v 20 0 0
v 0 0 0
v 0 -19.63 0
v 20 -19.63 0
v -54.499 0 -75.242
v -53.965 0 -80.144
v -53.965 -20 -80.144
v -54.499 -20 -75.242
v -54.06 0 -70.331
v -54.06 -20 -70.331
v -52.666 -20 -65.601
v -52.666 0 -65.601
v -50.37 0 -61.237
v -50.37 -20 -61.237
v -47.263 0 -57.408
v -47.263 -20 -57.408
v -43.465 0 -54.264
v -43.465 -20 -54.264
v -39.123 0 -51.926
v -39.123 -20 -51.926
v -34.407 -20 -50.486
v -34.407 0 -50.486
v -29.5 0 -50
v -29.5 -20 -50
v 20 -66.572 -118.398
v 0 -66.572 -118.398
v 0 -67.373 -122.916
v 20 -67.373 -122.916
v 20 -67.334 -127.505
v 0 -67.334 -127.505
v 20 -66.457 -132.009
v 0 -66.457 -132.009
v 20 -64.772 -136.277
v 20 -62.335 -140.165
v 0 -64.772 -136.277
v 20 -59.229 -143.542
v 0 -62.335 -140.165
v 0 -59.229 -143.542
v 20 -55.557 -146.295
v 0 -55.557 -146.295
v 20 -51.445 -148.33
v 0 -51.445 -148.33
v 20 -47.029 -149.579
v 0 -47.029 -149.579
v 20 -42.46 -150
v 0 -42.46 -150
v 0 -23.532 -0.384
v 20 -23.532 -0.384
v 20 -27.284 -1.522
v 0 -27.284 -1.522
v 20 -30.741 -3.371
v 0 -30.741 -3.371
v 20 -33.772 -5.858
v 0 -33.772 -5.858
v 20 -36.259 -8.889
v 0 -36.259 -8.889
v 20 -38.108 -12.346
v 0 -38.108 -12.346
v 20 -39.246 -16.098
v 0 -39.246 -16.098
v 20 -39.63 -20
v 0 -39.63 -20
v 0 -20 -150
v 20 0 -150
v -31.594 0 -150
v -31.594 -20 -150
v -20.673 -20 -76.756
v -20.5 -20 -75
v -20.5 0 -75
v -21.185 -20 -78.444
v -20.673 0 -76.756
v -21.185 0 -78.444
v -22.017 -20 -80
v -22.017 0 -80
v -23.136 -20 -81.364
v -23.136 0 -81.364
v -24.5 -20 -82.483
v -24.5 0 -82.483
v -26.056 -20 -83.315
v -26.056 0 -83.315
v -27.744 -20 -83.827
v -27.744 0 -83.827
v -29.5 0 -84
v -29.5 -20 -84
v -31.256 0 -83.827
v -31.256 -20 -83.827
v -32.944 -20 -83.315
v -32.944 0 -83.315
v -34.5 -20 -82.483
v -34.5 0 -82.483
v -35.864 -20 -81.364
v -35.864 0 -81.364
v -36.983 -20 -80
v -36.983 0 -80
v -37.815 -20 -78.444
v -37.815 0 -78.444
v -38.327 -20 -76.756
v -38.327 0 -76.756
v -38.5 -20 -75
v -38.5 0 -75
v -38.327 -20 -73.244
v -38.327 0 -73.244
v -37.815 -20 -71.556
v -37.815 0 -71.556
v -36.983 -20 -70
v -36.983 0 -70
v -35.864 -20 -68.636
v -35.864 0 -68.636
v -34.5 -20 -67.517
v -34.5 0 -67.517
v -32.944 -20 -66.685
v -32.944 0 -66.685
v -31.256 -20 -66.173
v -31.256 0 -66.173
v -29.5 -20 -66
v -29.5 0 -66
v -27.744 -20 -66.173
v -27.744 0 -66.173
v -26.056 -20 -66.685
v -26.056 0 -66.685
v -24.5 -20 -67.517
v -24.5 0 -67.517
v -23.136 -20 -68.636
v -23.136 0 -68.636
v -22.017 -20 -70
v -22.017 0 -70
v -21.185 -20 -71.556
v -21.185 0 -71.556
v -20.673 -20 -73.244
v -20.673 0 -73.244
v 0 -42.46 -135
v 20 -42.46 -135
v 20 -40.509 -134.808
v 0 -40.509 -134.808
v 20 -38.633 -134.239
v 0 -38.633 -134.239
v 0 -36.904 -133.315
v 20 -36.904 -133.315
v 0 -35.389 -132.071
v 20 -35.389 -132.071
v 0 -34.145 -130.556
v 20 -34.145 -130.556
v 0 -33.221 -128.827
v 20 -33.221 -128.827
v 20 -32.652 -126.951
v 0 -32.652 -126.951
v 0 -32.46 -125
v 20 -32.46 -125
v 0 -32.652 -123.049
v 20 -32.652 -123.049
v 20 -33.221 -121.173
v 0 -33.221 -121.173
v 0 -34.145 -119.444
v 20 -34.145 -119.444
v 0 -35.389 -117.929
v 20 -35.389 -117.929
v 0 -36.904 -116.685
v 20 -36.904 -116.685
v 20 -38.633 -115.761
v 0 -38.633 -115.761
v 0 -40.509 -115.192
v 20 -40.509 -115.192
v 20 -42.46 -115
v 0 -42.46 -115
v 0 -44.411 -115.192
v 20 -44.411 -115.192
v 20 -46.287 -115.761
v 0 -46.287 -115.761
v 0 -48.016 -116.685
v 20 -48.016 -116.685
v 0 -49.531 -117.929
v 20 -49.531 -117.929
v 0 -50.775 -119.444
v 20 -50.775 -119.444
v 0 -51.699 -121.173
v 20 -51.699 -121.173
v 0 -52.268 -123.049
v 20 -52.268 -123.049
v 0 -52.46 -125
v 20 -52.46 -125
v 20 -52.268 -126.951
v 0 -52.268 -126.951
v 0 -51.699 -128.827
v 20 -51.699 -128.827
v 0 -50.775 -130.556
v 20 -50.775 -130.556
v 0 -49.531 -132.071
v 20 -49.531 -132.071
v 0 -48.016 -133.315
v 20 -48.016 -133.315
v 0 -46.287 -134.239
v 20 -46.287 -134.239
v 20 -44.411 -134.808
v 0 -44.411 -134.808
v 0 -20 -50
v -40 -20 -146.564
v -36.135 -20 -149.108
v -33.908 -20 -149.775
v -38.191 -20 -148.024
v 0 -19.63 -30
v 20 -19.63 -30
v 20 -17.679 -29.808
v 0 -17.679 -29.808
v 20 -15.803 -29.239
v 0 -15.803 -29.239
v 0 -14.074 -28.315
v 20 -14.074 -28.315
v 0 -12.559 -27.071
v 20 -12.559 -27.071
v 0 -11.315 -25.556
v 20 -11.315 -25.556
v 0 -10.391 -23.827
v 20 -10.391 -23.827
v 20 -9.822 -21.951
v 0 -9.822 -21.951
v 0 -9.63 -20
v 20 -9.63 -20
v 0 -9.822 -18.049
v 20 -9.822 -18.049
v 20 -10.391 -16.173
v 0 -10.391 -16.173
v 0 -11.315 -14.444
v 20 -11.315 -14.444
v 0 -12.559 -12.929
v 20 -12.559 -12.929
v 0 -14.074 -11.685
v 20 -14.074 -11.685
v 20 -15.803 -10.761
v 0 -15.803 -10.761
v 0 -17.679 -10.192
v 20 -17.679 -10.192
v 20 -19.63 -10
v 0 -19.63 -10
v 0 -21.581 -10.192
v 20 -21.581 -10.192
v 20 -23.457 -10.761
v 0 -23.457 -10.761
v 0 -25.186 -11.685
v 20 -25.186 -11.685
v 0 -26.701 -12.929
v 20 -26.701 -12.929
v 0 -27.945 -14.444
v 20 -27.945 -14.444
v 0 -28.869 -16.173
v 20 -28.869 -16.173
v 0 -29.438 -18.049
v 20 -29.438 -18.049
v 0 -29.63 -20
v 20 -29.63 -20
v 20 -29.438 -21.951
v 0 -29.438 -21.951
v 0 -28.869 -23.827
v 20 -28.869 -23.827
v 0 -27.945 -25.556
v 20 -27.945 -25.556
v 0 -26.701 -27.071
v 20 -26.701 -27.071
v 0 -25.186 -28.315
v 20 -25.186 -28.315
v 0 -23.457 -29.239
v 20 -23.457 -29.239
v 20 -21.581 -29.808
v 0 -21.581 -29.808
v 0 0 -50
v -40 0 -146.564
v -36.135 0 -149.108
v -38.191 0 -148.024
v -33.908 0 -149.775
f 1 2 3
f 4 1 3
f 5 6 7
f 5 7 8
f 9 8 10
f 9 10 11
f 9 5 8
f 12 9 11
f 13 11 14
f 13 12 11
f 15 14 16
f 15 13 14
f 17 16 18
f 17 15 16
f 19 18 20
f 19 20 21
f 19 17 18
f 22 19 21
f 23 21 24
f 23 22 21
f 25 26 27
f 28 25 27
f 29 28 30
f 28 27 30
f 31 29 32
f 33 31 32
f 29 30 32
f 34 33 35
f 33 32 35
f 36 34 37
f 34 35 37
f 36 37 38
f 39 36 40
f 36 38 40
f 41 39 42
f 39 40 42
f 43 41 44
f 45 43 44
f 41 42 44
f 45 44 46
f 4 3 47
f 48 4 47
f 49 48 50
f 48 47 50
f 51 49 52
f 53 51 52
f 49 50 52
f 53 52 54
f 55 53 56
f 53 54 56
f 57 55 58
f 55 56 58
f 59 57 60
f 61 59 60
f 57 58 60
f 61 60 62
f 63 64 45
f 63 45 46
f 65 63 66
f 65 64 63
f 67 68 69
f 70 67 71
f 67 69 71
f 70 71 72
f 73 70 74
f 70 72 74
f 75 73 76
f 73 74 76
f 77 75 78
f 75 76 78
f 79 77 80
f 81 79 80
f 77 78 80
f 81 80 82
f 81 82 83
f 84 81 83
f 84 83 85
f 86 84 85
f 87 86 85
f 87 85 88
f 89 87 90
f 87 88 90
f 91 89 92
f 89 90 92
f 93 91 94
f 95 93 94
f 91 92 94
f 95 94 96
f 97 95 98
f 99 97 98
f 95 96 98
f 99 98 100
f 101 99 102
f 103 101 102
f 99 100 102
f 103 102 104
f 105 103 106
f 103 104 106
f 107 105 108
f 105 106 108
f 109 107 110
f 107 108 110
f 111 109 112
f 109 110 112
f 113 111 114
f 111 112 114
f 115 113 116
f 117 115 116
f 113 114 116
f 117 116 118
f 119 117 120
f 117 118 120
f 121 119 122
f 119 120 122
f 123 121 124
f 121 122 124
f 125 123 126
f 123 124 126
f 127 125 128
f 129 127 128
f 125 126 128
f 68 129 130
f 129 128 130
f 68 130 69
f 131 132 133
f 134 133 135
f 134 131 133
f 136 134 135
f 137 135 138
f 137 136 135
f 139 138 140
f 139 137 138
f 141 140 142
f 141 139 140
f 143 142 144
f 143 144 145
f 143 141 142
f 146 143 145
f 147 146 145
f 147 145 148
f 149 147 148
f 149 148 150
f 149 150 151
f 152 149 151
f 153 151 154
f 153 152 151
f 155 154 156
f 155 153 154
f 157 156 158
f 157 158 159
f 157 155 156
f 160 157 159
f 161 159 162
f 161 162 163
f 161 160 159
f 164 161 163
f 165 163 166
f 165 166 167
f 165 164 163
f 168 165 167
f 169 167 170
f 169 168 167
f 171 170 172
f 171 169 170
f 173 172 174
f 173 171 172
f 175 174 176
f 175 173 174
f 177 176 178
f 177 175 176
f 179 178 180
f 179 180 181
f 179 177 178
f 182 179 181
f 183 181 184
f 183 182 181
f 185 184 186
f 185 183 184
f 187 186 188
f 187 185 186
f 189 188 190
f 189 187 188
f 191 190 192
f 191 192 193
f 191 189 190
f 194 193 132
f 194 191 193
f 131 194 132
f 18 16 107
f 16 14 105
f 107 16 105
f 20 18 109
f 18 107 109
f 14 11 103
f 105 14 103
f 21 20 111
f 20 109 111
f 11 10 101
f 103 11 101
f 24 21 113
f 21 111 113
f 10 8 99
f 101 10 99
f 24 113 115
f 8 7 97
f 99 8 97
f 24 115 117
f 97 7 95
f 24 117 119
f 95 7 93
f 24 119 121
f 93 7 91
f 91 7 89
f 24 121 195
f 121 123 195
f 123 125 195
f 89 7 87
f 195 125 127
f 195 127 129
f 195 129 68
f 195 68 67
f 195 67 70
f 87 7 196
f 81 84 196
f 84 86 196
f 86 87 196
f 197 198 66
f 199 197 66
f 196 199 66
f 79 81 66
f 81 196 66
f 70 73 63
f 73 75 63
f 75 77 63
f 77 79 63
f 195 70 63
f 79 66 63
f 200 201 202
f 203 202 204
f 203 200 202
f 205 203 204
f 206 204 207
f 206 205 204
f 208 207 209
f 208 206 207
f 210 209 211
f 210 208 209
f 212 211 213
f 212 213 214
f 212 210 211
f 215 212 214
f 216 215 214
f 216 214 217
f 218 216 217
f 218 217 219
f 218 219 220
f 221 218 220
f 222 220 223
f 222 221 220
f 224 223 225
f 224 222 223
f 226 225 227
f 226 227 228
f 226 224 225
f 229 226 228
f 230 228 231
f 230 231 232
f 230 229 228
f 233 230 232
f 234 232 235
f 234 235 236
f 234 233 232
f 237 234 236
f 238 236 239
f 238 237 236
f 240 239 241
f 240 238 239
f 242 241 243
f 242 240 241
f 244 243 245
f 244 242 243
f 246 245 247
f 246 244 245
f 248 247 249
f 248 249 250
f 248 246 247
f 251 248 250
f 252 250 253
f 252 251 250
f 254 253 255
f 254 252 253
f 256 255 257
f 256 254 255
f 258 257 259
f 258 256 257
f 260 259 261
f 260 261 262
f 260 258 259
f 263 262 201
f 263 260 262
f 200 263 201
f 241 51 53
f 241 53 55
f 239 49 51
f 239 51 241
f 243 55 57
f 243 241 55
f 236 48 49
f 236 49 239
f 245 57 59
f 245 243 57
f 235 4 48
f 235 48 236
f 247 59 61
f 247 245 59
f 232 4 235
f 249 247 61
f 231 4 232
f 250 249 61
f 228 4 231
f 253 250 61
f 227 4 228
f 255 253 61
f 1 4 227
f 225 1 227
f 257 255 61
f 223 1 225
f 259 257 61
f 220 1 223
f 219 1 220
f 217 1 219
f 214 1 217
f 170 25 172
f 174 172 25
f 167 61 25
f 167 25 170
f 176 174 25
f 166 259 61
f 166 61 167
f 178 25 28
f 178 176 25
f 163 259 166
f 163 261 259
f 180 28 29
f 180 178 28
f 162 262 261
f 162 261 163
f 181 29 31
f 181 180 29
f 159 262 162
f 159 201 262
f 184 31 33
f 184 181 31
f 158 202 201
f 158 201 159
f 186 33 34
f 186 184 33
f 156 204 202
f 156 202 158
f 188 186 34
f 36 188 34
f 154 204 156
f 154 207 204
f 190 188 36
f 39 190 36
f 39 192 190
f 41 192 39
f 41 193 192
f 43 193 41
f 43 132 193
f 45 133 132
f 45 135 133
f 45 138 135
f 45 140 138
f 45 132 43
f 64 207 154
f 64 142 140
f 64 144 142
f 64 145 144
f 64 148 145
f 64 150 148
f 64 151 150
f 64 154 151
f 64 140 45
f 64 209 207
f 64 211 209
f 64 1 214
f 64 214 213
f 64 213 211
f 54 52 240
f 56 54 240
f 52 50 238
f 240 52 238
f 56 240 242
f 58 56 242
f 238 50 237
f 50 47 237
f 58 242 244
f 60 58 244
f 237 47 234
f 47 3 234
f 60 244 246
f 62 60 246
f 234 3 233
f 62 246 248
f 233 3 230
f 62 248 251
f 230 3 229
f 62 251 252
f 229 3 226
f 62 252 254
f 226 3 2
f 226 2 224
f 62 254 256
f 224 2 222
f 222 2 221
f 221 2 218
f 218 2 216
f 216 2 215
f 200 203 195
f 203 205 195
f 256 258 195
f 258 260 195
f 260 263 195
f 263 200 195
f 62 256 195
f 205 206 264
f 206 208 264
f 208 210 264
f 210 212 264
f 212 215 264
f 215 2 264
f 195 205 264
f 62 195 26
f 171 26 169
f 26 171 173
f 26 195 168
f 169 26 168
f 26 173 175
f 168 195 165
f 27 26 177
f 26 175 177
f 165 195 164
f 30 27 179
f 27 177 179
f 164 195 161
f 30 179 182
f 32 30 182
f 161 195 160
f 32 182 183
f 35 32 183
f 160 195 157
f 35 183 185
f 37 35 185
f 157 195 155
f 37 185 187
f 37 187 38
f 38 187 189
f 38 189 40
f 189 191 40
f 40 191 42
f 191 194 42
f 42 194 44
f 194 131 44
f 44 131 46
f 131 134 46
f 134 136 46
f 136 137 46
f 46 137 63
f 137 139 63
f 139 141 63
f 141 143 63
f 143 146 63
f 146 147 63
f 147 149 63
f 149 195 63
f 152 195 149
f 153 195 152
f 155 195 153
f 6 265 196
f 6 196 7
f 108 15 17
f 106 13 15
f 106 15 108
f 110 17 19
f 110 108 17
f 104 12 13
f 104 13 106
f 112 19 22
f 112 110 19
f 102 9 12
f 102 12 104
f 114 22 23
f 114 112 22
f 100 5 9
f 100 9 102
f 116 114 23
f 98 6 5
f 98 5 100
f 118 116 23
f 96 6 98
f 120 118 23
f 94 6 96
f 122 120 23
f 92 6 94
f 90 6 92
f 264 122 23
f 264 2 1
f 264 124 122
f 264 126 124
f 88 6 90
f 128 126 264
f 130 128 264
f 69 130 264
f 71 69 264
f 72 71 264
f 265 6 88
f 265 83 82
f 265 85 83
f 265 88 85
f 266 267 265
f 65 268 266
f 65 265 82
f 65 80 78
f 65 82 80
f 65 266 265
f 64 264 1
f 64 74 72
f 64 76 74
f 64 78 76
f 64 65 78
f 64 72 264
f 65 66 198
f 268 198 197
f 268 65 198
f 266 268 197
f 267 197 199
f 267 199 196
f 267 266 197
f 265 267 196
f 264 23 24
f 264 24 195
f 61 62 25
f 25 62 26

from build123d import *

# Parameters (mm, degrees)
SKETCH1_R           = 10
BOSS_EXTRUDE1_DEPTH = 20
SKETCH2_R           = 9
BOSS_EXTRUDE2_DEPTH = 20


with BuildPart() as part:
    # Sketch1 → Boss-Extrude1 (new body)
    with BuildSketch(Plane(origin=(0, 0, 0), x_dir=(0, 0, -1), z_dir=(1, 0, 0))):
        with BuildLine():
            Line((0, 0), (0, -19.63))
            ThreePointArc((0, -19.63), (5.857864376, -33.772135624), (20, -39.63))
            Line((20, -39.63), (118.39773122, -66.572445893))
            ThreePointArc((118.39773122, -66.572445893), (140.164815866, -62.335320368), (150, -42.46))
            Line((150, -42.46), (150, 0))
            Line((150, 0), (0, 0))
        make_face()
        with Locations((20, -19.63)):
            Circle(SKETCH1_R, mode=Mode.SUBTRACT)
        with Locations((125, -42.46)):
            Circle(SKETCH1_R, mode=Mode.SUBTRACT)
    extrude(amount=BOSS_EXTRUDE1_DEPTH)

    # Sketch2 → Boss-Extrude2 (add)
    with BuildSketch(Plane(origin=(0, 0, 0), x_dir=(1, 0, 0), z_dir=(0, 1, 0))):
        with BuildLine():
            Line((0, 150), (-31.593900405, 150))
            ThreePointArc((-31.593900405, 150), (-36.134562655, 149.107762436), (-40, 146.563731056))
            Line((-40, 146.563731056), (-53.965083284, 80.143899292))
            ThreePointArc((-53.965083284, 80.143899292), (-48.911304468, 59.245595573), (-29.5, 50))
            Line((-29.5, 50), (0, 50))
            Line((0, 50), (0, 150))
        make_face()
        with Locations((-29.5, 75)):
            Circle(SKETCH2_R, mode=Mode.SUBTRACT)
    extrude(amount=-BOSS_EXTRUDE2_DEPTH)


solid = part.part
